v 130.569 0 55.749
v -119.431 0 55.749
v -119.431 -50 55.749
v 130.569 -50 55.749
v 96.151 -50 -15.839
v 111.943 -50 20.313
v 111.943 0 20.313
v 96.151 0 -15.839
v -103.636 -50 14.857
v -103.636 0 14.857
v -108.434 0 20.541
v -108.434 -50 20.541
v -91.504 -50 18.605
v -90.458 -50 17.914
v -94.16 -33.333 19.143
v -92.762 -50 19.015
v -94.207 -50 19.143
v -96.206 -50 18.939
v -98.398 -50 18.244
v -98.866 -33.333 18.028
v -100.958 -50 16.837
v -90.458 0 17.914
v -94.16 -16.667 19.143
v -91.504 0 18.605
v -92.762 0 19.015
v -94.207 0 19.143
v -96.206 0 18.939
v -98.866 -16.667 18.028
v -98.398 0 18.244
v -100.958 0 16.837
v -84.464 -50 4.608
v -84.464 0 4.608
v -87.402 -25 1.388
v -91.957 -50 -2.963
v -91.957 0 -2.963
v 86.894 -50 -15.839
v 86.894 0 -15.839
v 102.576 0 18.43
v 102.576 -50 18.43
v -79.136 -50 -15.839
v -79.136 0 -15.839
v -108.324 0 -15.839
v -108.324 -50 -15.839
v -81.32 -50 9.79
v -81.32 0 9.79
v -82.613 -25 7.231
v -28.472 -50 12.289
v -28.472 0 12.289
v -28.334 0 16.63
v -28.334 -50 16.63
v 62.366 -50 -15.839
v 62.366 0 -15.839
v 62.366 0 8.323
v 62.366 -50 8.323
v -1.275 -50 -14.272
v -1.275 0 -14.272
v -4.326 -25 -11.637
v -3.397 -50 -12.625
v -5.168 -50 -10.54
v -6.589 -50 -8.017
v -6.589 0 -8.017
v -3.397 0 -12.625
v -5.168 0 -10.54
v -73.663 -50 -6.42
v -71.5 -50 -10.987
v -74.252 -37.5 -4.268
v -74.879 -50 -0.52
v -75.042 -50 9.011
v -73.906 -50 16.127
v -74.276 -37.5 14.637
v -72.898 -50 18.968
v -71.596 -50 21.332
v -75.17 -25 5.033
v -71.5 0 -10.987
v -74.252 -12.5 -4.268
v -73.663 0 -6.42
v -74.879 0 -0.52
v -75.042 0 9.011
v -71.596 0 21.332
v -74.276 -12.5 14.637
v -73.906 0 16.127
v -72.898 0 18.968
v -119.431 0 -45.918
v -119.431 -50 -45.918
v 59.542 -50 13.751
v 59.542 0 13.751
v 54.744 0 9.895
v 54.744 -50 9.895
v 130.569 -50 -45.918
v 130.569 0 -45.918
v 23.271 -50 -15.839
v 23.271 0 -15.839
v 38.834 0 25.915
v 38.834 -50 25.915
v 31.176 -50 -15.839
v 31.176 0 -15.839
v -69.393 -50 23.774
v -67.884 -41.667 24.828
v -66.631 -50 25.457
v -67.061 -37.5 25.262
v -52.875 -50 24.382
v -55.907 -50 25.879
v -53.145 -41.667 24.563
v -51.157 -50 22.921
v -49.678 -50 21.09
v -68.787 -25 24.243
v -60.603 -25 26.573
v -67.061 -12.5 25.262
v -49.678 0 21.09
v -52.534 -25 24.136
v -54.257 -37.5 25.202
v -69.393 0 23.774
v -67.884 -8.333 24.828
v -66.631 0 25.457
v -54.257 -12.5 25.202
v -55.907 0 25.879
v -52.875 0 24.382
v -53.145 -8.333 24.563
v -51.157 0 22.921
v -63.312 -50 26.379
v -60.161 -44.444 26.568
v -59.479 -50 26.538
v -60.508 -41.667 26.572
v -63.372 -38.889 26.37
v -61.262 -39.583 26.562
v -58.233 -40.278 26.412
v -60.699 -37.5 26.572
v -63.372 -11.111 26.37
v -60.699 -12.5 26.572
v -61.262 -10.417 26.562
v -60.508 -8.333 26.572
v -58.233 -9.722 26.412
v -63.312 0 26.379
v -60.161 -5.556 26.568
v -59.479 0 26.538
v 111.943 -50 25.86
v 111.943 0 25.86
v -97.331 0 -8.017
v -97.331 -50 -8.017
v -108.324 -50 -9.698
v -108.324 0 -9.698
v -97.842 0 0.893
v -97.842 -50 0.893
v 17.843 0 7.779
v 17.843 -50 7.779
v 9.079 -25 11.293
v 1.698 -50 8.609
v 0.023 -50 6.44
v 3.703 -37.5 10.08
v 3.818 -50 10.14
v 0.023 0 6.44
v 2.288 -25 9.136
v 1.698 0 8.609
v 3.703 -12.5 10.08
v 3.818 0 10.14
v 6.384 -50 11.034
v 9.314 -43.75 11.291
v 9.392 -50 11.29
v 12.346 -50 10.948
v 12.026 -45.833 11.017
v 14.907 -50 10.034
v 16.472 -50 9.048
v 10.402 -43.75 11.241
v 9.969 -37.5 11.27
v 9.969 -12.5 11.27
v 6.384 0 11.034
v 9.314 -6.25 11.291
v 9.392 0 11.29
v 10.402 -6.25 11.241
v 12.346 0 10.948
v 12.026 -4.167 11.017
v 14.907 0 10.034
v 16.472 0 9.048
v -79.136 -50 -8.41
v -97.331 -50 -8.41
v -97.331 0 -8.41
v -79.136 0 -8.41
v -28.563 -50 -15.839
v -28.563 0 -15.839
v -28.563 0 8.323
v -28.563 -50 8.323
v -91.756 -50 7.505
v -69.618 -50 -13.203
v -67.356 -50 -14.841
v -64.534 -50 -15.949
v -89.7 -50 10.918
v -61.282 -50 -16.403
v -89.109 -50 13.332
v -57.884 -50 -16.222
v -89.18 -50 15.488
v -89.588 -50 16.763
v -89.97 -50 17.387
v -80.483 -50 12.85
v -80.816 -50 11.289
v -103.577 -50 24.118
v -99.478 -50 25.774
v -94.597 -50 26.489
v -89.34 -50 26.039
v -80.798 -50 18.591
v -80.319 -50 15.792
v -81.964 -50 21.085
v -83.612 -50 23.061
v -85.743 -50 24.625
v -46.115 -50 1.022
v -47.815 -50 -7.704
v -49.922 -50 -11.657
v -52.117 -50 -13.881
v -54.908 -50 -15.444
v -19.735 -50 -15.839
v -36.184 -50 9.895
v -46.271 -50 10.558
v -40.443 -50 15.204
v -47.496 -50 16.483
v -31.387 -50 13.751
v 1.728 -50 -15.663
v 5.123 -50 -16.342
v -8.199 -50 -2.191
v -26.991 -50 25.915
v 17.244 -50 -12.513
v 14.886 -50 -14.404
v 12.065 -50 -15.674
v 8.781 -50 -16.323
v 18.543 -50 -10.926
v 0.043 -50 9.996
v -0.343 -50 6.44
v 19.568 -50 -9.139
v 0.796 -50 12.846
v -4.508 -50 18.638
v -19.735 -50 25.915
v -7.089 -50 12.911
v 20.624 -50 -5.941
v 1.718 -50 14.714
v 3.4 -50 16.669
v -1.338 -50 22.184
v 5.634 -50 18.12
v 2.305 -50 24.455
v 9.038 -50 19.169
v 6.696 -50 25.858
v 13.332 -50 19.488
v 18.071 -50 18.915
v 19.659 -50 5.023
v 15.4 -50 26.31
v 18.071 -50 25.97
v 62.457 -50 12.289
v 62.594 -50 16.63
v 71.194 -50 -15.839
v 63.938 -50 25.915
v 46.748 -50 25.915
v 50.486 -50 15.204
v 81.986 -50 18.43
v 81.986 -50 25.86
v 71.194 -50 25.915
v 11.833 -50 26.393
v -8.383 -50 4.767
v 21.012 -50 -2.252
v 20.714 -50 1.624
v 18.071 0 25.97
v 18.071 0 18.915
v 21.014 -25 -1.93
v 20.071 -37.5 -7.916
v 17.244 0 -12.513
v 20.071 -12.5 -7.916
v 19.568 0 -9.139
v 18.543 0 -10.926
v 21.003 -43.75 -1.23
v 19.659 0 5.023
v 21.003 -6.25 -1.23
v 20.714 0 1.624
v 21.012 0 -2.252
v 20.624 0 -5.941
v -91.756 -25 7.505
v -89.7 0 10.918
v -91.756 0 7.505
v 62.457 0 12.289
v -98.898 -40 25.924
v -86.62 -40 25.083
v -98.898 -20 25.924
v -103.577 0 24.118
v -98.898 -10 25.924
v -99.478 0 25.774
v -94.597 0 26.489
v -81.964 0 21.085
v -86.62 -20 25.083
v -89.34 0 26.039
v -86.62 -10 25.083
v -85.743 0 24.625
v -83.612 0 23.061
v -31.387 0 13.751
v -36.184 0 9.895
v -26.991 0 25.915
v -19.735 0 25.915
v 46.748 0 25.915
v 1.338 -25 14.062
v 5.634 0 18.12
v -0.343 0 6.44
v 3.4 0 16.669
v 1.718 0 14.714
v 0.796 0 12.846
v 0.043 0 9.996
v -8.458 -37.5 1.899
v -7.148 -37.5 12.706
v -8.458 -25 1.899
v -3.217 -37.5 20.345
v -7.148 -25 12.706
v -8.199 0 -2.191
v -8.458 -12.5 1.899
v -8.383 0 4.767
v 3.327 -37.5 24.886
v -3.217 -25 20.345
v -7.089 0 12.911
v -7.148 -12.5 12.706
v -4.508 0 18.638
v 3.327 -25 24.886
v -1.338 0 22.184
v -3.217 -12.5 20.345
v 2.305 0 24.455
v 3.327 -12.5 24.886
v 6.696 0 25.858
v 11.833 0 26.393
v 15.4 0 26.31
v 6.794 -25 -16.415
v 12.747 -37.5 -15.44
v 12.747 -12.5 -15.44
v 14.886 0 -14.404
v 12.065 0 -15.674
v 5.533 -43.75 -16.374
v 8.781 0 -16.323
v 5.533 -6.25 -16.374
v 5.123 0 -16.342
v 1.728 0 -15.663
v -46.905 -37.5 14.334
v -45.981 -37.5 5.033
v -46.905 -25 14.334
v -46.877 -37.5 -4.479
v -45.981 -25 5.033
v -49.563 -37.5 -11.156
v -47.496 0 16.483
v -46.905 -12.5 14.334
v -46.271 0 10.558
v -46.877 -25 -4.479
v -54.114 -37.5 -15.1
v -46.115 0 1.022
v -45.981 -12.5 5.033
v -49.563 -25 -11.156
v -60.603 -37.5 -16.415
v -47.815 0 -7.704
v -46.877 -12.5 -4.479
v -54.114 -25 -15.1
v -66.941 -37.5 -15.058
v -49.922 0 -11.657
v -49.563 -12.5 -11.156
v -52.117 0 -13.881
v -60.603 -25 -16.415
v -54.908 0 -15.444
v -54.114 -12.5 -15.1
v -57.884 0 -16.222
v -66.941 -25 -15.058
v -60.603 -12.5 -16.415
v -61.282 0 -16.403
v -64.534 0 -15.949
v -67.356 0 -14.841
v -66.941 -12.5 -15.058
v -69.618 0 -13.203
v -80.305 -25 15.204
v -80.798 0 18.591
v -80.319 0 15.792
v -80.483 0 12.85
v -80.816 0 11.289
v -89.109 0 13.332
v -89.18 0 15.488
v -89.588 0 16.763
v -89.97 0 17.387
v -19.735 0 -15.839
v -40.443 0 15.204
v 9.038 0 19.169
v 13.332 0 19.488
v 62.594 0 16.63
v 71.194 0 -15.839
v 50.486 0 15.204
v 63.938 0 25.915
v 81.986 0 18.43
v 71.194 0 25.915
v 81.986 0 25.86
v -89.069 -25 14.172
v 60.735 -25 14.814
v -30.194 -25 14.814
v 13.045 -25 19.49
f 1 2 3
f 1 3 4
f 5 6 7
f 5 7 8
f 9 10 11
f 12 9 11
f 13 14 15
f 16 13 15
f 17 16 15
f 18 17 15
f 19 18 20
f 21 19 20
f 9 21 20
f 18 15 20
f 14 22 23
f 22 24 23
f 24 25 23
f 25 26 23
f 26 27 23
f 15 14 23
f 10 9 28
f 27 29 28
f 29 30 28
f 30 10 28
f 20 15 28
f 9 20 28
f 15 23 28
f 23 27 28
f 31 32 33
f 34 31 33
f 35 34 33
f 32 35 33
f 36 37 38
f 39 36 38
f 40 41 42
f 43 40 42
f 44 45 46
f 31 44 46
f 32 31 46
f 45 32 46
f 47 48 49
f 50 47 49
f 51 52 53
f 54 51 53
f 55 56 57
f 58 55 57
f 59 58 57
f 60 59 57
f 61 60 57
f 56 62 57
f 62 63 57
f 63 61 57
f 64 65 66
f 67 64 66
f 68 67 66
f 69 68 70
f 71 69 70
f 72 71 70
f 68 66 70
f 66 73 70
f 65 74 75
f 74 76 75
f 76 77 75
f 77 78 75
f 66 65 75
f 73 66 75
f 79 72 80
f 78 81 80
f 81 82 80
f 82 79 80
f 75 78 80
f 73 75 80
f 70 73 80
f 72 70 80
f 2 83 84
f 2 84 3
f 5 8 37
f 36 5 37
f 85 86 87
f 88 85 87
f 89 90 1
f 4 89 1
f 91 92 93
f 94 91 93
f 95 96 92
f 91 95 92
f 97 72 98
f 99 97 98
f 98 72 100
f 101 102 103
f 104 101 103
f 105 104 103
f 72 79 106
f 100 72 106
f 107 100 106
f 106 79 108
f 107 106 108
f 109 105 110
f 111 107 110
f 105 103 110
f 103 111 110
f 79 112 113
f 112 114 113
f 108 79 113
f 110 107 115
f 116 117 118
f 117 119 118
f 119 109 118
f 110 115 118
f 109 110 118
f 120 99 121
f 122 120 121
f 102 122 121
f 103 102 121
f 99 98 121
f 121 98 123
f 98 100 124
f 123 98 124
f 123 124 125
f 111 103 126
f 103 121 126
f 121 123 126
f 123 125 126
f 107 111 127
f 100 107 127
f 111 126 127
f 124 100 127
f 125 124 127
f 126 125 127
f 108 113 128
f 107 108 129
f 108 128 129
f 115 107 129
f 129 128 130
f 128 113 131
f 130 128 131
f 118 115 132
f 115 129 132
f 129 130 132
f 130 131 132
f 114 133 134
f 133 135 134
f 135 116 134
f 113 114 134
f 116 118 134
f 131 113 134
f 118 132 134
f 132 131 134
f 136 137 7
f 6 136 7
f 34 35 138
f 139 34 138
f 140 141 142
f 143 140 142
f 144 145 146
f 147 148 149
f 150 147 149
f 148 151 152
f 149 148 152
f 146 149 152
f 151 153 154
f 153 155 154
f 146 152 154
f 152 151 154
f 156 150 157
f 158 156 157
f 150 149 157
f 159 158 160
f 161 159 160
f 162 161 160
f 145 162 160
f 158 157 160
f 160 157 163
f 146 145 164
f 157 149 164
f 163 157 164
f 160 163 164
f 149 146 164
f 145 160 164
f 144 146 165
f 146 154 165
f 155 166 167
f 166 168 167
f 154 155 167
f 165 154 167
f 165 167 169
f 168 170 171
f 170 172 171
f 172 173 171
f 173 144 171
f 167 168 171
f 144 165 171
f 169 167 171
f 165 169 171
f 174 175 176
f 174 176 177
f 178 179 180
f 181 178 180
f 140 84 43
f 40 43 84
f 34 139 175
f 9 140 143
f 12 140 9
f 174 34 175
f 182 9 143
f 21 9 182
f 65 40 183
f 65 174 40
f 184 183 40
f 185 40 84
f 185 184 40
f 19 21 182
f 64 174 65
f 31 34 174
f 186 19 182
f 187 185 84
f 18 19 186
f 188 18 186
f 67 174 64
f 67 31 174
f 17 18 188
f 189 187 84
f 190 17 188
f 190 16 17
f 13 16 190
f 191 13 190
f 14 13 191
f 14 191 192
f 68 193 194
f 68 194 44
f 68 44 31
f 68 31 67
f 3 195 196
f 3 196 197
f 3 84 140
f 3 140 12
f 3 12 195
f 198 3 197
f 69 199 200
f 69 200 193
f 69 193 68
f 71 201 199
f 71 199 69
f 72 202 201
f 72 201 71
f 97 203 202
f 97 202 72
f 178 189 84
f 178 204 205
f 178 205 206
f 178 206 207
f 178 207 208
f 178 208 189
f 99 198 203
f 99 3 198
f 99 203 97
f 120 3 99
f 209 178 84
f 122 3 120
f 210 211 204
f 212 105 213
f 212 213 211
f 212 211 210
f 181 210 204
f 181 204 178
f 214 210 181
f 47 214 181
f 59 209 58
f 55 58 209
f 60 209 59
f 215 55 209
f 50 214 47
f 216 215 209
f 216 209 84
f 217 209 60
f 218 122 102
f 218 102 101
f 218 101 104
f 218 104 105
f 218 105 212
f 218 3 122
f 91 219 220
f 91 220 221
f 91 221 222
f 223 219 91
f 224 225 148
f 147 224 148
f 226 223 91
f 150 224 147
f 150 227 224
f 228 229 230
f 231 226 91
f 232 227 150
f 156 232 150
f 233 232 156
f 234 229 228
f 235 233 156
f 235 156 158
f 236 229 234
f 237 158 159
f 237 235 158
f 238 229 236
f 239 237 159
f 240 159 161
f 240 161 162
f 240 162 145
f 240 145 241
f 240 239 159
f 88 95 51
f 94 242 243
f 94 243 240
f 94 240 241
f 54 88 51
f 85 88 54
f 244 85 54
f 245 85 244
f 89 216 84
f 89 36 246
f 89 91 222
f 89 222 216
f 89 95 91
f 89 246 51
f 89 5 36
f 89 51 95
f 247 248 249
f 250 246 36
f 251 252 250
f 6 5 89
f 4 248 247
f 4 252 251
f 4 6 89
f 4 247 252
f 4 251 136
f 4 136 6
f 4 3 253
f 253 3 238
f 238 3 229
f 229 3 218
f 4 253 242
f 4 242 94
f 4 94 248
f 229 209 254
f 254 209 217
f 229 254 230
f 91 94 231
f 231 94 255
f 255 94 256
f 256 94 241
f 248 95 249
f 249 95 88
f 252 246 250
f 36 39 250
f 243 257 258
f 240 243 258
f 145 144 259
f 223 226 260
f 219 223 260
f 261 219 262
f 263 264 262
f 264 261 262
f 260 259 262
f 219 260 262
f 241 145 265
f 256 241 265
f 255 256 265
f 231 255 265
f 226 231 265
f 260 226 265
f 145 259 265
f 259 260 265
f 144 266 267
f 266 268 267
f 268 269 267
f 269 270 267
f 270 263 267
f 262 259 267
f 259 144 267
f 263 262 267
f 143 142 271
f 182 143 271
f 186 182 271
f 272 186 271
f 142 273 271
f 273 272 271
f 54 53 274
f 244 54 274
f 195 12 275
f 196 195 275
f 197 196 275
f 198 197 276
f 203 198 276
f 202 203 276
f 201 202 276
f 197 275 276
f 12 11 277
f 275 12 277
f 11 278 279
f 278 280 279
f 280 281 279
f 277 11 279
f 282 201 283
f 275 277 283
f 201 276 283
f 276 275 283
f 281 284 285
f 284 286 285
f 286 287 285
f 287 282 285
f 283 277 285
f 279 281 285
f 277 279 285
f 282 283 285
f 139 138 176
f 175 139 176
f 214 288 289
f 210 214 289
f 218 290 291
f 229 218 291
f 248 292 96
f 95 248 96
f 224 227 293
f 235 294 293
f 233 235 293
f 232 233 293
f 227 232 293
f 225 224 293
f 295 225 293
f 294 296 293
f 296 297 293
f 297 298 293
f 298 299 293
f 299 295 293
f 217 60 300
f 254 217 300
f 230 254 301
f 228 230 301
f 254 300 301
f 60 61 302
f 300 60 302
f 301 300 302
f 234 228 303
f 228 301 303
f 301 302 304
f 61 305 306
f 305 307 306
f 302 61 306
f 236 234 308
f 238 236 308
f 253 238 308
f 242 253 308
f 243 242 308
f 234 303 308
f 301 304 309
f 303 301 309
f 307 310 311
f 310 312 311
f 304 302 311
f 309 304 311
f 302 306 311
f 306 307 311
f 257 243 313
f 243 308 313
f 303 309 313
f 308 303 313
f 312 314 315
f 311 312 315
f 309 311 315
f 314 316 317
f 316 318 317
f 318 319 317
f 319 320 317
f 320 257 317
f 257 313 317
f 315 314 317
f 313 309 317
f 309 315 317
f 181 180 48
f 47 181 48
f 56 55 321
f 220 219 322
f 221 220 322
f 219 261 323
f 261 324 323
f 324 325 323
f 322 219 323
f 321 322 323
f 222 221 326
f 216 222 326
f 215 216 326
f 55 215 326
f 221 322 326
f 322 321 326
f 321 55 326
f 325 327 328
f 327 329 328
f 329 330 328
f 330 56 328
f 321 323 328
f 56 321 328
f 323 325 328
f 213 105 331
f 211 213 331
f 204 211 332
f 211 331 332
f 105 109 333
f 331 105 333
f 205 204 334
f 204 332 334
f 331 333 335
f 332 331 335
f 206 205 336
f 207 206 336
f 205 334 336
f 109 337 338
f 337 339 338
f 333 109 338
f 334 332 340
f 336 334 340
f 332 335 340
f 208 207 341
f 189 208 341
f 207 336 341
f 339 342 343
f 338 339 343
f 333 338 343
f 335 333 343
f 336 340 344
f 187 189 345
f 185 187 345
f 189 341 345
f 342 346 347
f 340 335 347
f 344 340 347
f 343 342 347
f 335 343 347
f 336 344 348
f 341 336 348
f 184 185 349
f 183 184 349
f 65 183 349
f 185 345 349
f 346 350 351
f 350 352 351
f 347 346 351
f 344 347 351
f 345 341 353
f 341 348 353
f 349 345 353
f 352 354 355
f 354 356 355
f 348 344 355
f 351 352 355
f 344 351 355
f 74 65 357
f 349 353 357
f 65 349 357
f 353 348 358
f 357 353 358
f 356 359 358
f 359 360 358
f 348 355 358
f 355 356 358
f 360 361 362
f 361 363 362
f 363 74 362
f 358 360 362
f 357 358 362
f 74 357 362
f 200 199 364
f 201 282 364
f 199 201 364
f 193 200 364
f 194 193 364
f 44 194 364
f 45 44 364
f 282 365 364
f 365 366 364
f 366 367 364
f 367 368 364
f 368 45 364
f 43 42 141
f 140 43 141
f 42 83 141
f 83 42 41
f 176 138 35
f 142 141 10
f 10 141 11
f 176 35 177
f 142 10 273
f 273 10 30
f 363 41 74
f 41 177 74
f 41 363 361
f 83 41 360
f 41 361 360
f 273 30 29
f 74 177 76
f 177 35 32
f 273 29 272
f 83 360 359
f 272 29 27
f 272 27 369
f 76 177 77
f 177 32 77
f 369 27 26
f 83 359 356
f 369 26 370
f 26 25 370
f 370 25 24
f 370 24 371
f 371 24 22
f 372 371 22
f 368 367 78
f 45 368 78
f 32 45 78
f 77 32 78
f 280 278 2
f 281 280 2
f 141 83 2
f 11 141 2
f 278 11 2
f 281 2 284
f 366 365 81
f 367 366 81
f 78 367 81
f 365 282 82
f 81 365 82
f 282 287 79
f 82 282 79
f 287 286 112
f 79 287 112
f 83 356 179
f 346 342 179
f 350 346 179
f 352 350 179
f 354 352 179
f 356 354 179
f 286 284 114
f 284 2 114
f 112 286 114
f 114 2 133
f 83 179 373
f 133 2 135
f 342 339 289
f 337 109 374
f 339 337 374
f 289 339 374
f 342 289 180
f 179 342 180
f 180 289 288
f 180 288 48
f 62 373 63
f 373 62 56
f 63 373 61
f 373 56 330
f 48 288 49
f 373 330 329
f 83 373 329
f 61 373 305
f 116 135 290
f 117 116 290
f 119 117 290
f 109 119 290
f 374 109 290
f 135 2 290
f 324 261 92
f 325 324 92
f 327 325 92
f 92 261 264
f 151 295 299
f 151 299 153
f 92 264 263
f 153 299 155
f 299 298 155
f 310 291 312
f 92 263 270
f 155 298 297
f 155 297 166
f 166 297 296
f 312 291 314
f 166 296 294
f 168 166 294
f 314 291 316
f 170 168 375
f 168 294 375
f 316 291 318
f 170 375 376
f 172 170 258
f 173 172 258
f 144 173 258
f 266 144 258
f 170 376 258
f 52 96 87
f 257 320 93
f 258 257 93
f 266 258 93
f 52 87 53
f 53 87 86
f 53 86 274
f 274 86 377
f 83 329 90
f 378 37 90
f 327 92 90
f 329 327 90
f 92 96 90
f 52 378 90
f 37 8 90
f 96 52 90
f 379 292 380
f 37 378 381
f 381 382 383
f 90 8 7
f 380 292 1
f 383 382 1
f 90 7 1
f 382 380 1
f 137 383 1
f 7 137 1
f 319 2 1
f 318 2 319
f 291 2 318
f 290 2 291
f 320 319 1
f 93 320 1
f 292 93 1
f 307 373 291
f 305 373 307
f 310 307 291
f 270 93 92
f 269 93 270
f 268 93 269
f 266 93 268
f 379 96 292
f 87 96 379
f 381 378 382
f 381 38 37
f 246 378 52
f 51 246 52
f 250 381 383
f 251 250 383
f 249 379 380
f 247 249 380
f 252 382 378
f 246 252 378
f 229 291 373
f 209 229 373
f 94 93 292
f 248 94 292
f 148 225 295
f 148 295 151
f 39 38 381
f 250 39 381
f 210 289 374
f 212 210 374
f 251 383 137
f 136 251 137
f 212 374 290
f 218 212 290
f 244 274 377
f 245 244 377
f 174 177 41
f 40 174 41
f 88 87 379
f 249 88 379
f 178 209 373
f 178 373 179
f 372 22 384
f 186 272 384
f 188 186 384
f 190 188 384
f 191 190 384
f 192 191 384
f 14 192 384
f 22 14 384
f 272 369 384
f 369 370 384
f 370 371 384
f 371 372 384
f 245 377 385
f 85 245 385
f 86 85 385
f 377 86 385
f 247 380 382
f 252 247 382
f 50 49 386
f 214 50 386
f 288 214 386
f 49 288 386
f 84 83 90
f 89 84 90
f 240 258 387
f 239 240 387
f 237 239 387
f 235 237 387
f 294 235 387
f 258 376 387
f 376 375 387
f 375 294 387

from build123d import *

# Parameters (mm, degrees)
F0_W     = 250
F0_H     = 101.666841656
F1_DEPTH = 50


with BuildPart() as f1:
    # F0 (on Front) → F1 (new body)
    with BuildSketch(Plane.XZ):
        with Locations((5.5693238974, 4.9150865525)):
            Rectangle(F0_W, F0_H)
        with BuildLine():
            Line((-79.1357593007, -8.4097307281), (-79.1357593007, -15.8393876627))
            Line((-79.1357593007, -15.8393876627), (-108.3243500131, -15.8393876627))
            Line((-108.3243500131, -15.8393876627), (-108.3243500131, -9.6982690156))
            Line((-108.3243500131, -9.6982690156), (-97.8424108938, 0.8933329367))
            add(Edge.make_bspline(
                [(-97.8424108938, 0.8933329367), (-93.181740492, 5.6636661714), (-91.7561236632, 7.5050879086)],
                knots=[0, 0, 0, 1, 1, 1], degree=2))
            add(Edge.make_bspline(
                [(-91.7561236632, 7.5050879086), (-90.3305068344, 9.3465096458), (-89.6999455448, 10.9183435852)],
                knots=[0, 0, 0, 1, 1, 1], degree=2))
            add(Edge.make_bspline(
                [(-89.6999455448, 10.9183435852), (-89.0693842551, 12.4901775246), (-89.0693842551, 14.1716742971)],
                knots=[0, 0, 0, 1, 1, 1], degree=2))
            add(Edge.make_bspline(
                [(-89.0693842551, 14.1716742971), (-89.0693842551, 16.6847808863), (-90.4584468062, 17.9139184726)],
                knots=[0, 0, 0, 1, 1, 1], degree=2))
            add(Edge.make_bspline(
                [(-90.4584468062, 17.9139184726), (-91.8475093573, 19.143056059), (-94.1595674194, 19.143056059)],
                knots=[0, 0, 0, 1, 1, 1], degree=2))
            add(Edge.make_bspline(
                [(-94.1595674194, 19.143056059), (-96.5812883145, 19.143056059), (-98.8659306683, 18.0281505903)],
                knots=[0, 0, 0, 1, 1, 1], degree=2))
            add(Edge.make_bspline(
                [(-98.8659306683, 18.0281505903), (-101.1505730221, 16.9132451216), (-103.6362639031, 14.8570670032)],
                knots=[0, 0, 0, 1, 1, 1], degree=2))
            Line((-103.6362639031, 14.8570670032), (-108.4340128461, 20.5412571795))
            add(Edge.make_bspline(
                [(-108.4340128461, 20.5412571795), (-105.3543149531, 23.1731651711), (-103.3255525429, 24.2560856468)],
                knots=[0, 0, 0, 1, 1, 1], degree=2))
            add(Edge.make_bspline(
                [(-103.3255525429, 24.2560856468), (-101.2967901327, 25.3390061225), (-98.8979156612, 25.9238745651)],
                knots=[0, 0, 0, 1, 1, 1], degree=2))
            add(Edge.make_bspline(
                [(-98.8979156612, 25.9238745651), (-96.4990411897, 26.5087430077), (-93.5290061298, 26.5087430077)],
                knots=[0, 0, 0, 1, 1, 1], degree=2))
            add(Edge.make_bspline(
                [(-93.5290061298, 26.5087430077), (-89.61769842, 26.5087430077), (-86.6202476518, 25.0831261789)],
                knots=[0, 0, 0, 1, 1, 1], degree=2))
            add(Edge.make_bspline(
                [(-86.6202476518, 25.0831261789), (-83.6227968836, 23.6575093501), (-81.9641465347, 21.0850020597)],
                knots=[0, 0, 0, 1, 1, 1], degree=2))
            add(Edge.make_bspline(
                [(-81.9641465347, 21.0850020597), (-80.3054961859, 18.5124947693), (-80.3054961859, 15.204332641)],
                knots=[0, 0, 0, 1, 1, 1], degree=2))
            add(Edge.make_bspline(
                [(-80.3054961859, 15.204332641), (-80.3054961859, 12.3165447058), (-81.3198773909, 9.7897302624)],
                knots=[0, 0, 0, 1, 1, 1], degree=2))
            add(Edge.make_bspline(
                [(-81.3198773909, 9.7897302624), (-82.334258596, 7.2629158191), (-84.4635452698, 4.608161404)],
                knots=[0, 0, 0, 1, 1, 1], degree=2))
            add(Edge.make_bspline(
                [(-84.4635452698, 4.608161404), (-86.5928319436, 1.9534069888), (-91.9571721903, -2.9631433566)],
                knots=[0, 0, 0, 1, 1, 1], degree=2))
            Line((-91.9571721903, -2.9631433566), (-97.3306510065, -8.0167722432))
            Line((-97.3306510065, -8.0167722432), (-97.3306510065, -8.4097307281))
            Line((-97.3306510065, -8.4097307281), (-79.1357593007, -8.4097307281))
        make_face(mode=Mode.SUBTRACT)
        with BuildLine():
            add(Edge.make_bspline(
                [(-49.6775807906, 21.0895713444), (-45.9810294621, 15.6064296953), (-45.9810294621, 5.0331048818)],
                knots=[0, 0, 0, 1, 1, 1], degree=2))
            add(Edge.make_bspline(
                [(-45.9810294621, 5.0331048818), (-45.9810294621, -5.8966241389), (-49.5633486729, -11.1558708374)],
                knots=[0, 0, 0, 1, 1, 1], degree=2))
            add(Edge.make_bspline(
                [(-49.5633486729, -11.1558708374), (-53.1456678837, -16.4151175359), (-60.6027405265, -16.4151175359)],
                knots=[0, 0, 0, 1, 1, 1], degree=2))
            add(Edge.make_bspline(
                [(-60.6027405265, -16.4151175359), (-67.831348934, -16.4151175359), (-71.5004845542, -10.9868073032)],
                knots=[0, 0, 0, 1, 1, 1], degree=2))
            add(Edge.make_bspline(
                [(-71.5004845542, -10.9868073032), (-75.1696201745, -5.5584970705), (-75.1696201745, 5.0331048818)],
                knots=[0, 0, 0, 1, 1, 1], degree=2))
            add(Edge.make_bspline(
                [(-75.1696201745, 5.0331048818), (-75.1696201745, 16.0907738743), (-71.5964395331, 21.3317434339)],
                knots=[0, 0, 0, 1, 1, 1], degree=2))
            add(Edge.make_bspline(
                [(-71.5964395331, 21.3317434339), (-68.0232588917, 26.5727129936), (-60.6027405265, 26.5727129936)],
                knots=[0, 0, 0, 1, 1, 1], degree=2))
            add(Edge.make_bspline(
                [(-60.6027405265, 26.5727129936), (-53.374132119, 26.5727129936), (-49.6775807906, 21.0895713444)],
                knots=[0, 0, 0, 1, 1, 1], degree=2))
        make_face(mode=Mode.SUBTRACT)
        with BuildLine():
            Line((-19.7350581014, 25.9147359957), (-19.7350581014, -15.8393876627))
            Line((-19.7350581014, -15.8393876627), (-28.5629161566, -15.8393876627))
            Line((-28.5629161566, -15.8393876627), (-28.5629161566, 8.3229898713))
            Line((-28.5629161566, 8.3229898713), (-28.4715304624, 12.2891289975))
            Line((-28.4715304624, 12.2891289975), (-28.3344519212, 16.6299494698))
            add(Edge.make_bspline(
                [(-28.3344519212, 16.6299494698), (-30.5277085808, 14.4366928101), (-31.3867341059, 13.751300104)],
                knots=[0, 0, 0, 1, 1, 1], degree=2))
            Line((-31.3867341059, 13.751300104), (-36.1844830489, 9.8948238107))
            Line((-36.1844830489, 9.8948238107), (-40.4430563964, 15.204332641))
            Line((-40.4430563964, 15.204332641), (-26.9910822171, 25.9147359957))
            Line((-26.9910822171, 25.9147359957), (-19.7350581014, 25.9147359957))
        make_face(mode=Mode.SUBTRACT)
        with BuildLine():
            add(Edge.make_bspline(
                [(-6.5892259975, -8.0167722432), (-8.458063443, -3.9044160064), (-8.458063443, 1.8985755723)],
                knots=[0, 0, 0, 1, 1, 1], degree=2))
            add(Edge.make_bspline(
                [(-8.458063443, 1.8985755723), (-8.458063443, 14.2904756995), (-3.2170938833, 20.3447779371)],
                knots=[0, 0, 0, 1, 1, 1], degree=2))
            add(Edge.make_bspline(
                [(-3.2170938833, 20.3447779371), (2.0238756764, 26.3990801747), (12.4783990874, 26.3990801747)],
                knots=[0, 0, 0, 1, 1, 1], degree=2))
            add(Edge.make_bspline(
                [(12.4783990874, 26.3990801747), (16.0424411594, 26.3990801747), (18.0712035696, 25.9695674122)],
                knots=[0, 0, 0, 1, 1, 1], degree=2))
            Line((18.0712035696, 25.9695674122), (18.0712035696, 18.9145918236))
            add(Edge.make_bspline(
                [(18.0712035696, 18.9145918236), (15.5306812721, 19.4903216967), (13.0449903912, 19.4903216967)],
                knots=[0, 0, 0, 1, 1, 1], degree=2))
            add(Edge.make_bspline(
                [(13.0449903912, 19.4903216967), (8.5031213918, 19.4903216967), (5.6336105954, 18.1195362845)],
                knots=[0, 0, 0, 1, 1, 1], degree=2))
            add(Edge.make_bspline(
                [(5.6336105954, 18.1195362845), (2.764099799, 16.7487508722), (1.3384829702, 14.0620114641)],
                knots=[0, 0, 0, 1, 1, 1], degree=2))
            add(Edge.make_bspline(
                [(1.3384829702, 14.0620114641), (-0.0871338586, 11.375272056), (-0.3430138022, 6.4404445717)],
                knots=[0, 0, 0, 1, 1, 1], degree=2))
            Line((-0.3430138022, 6.4404445717), (0.0225289744, 6.4404445717))
            add(Edge.make_bspline(
                [(0.0225289744, 6.4404445717), (2.8554854932, 11.2930249312), (9.078851265, 11.2930249312)],
                knots=[0, 0, 0, 1, 1, 1], degree=2))
            add(Edge.make_bspline(
                [(9.078851265, 11.2930249312), (14.6716557471, 11.2930249312), (17.8427393342, 7.7792449911)],
                knots=[0, 0, 0, 1, 1, 1], degree=2))
            add(Edge.make_bspline(
                [(17.8427393342, 7.7792449911), (21.0138229213, 4.2654650509), (21.0138229213, -1.9304850127)],
                knots=[0, 0, 0, 1, 1, 1], degree=2))
            add(Edge.make_bspline(
                [(21.0138229213, -1.9304850127), (21.0138229213, -8.6107792552), (17.2441630375, -12.5129483955)],
                knots=[0, 0, 0, 1, 1, 1], degree=2))
            add(Edge.make_bspline(
                [(17.2441630375, -12.5129483955), (13.4745031537, -16.4151175359), (6.7942089111, -16.4151175359)],
                knots=[0, 0, 0, 1, 1, 1], degree=2))
            add(Edge.make_bspline(
                [(6.7942089111, -16.4151175359), (2.170092787, -16.4151175359), (-1.2751478826, -14.272123008)],
                knots=[0, 0, 0, 1, 1, 1], degree=2))
            add(Edge.make_bspline(
                [(-1.2751478826, -14.272123008), (-4.7203885521, -12.1291284801), (-6.5892259975, -8.0167722432)],
                knots=[0, 0, 0, 1, 1, 1], degree=2))
        make_face(mode=Mode.SUBTRACT)
        Polygon((38.8340332811, 25.9147359957), (46.7480343947, 25.9147359957), (31.1759121111, -15.8393876627), (23.2710495669, -15.8393876627), align=None, mode=Mode.SUBTRACT)
        with BuildLine():
            Line((71.1937075806, 25.9147359957), (71.1937075806, -15.8393876627))
            Line((71.1937075806, -15.8393876627), (62.3658495254, -15.8393876627))
            Line((62.3658495254, -15.8393876627), (62.3658495254, 8.3229898713))
            Line((62.3658495254, 8.3229898713), (62.4572352196, 12.2891289975))
            Line((62.4572352196, 12.2891289975), (62.5943137608, 16.6299494698))
            add(Edge.make_bspline(
                [(62.5943137608, 16.6299494698), (60.4010571011, 14.4366928101), (59.5420315761, 13.751300104)],
                knots=[0, 0, 0, 1, 1, 1], degree=2))
            Line((59.5420315761, 13.751300104), (54.7442826331, 9.8948238107))
            Line((54.7442826331, 9.8948238107), (50.4857092856, 15.204332641))
            Line((50.4857092856, 15.204332641), (63.9376834649, 25.9147359957))
            Line((63.9376834649, 25.9147359957), (71.1937075806, 25.9147359957))
        make_face(mode=Mode.SUBTRACT)
        Polygon((96.1511406537, -15.8393876627), (86.893769836, -15.8393876627), (102.5755549526, 18.4302476446), (81.98635806, 18.4302476446), (81.98635806, 25.8599045792), (111.9425886033, 25.8599045792), (111.9425886033, 20.3127929441), align=None, mode=Mode.SUBTRACT)
    extrude(amount=F1_DEPTH)


solid = f1.part
